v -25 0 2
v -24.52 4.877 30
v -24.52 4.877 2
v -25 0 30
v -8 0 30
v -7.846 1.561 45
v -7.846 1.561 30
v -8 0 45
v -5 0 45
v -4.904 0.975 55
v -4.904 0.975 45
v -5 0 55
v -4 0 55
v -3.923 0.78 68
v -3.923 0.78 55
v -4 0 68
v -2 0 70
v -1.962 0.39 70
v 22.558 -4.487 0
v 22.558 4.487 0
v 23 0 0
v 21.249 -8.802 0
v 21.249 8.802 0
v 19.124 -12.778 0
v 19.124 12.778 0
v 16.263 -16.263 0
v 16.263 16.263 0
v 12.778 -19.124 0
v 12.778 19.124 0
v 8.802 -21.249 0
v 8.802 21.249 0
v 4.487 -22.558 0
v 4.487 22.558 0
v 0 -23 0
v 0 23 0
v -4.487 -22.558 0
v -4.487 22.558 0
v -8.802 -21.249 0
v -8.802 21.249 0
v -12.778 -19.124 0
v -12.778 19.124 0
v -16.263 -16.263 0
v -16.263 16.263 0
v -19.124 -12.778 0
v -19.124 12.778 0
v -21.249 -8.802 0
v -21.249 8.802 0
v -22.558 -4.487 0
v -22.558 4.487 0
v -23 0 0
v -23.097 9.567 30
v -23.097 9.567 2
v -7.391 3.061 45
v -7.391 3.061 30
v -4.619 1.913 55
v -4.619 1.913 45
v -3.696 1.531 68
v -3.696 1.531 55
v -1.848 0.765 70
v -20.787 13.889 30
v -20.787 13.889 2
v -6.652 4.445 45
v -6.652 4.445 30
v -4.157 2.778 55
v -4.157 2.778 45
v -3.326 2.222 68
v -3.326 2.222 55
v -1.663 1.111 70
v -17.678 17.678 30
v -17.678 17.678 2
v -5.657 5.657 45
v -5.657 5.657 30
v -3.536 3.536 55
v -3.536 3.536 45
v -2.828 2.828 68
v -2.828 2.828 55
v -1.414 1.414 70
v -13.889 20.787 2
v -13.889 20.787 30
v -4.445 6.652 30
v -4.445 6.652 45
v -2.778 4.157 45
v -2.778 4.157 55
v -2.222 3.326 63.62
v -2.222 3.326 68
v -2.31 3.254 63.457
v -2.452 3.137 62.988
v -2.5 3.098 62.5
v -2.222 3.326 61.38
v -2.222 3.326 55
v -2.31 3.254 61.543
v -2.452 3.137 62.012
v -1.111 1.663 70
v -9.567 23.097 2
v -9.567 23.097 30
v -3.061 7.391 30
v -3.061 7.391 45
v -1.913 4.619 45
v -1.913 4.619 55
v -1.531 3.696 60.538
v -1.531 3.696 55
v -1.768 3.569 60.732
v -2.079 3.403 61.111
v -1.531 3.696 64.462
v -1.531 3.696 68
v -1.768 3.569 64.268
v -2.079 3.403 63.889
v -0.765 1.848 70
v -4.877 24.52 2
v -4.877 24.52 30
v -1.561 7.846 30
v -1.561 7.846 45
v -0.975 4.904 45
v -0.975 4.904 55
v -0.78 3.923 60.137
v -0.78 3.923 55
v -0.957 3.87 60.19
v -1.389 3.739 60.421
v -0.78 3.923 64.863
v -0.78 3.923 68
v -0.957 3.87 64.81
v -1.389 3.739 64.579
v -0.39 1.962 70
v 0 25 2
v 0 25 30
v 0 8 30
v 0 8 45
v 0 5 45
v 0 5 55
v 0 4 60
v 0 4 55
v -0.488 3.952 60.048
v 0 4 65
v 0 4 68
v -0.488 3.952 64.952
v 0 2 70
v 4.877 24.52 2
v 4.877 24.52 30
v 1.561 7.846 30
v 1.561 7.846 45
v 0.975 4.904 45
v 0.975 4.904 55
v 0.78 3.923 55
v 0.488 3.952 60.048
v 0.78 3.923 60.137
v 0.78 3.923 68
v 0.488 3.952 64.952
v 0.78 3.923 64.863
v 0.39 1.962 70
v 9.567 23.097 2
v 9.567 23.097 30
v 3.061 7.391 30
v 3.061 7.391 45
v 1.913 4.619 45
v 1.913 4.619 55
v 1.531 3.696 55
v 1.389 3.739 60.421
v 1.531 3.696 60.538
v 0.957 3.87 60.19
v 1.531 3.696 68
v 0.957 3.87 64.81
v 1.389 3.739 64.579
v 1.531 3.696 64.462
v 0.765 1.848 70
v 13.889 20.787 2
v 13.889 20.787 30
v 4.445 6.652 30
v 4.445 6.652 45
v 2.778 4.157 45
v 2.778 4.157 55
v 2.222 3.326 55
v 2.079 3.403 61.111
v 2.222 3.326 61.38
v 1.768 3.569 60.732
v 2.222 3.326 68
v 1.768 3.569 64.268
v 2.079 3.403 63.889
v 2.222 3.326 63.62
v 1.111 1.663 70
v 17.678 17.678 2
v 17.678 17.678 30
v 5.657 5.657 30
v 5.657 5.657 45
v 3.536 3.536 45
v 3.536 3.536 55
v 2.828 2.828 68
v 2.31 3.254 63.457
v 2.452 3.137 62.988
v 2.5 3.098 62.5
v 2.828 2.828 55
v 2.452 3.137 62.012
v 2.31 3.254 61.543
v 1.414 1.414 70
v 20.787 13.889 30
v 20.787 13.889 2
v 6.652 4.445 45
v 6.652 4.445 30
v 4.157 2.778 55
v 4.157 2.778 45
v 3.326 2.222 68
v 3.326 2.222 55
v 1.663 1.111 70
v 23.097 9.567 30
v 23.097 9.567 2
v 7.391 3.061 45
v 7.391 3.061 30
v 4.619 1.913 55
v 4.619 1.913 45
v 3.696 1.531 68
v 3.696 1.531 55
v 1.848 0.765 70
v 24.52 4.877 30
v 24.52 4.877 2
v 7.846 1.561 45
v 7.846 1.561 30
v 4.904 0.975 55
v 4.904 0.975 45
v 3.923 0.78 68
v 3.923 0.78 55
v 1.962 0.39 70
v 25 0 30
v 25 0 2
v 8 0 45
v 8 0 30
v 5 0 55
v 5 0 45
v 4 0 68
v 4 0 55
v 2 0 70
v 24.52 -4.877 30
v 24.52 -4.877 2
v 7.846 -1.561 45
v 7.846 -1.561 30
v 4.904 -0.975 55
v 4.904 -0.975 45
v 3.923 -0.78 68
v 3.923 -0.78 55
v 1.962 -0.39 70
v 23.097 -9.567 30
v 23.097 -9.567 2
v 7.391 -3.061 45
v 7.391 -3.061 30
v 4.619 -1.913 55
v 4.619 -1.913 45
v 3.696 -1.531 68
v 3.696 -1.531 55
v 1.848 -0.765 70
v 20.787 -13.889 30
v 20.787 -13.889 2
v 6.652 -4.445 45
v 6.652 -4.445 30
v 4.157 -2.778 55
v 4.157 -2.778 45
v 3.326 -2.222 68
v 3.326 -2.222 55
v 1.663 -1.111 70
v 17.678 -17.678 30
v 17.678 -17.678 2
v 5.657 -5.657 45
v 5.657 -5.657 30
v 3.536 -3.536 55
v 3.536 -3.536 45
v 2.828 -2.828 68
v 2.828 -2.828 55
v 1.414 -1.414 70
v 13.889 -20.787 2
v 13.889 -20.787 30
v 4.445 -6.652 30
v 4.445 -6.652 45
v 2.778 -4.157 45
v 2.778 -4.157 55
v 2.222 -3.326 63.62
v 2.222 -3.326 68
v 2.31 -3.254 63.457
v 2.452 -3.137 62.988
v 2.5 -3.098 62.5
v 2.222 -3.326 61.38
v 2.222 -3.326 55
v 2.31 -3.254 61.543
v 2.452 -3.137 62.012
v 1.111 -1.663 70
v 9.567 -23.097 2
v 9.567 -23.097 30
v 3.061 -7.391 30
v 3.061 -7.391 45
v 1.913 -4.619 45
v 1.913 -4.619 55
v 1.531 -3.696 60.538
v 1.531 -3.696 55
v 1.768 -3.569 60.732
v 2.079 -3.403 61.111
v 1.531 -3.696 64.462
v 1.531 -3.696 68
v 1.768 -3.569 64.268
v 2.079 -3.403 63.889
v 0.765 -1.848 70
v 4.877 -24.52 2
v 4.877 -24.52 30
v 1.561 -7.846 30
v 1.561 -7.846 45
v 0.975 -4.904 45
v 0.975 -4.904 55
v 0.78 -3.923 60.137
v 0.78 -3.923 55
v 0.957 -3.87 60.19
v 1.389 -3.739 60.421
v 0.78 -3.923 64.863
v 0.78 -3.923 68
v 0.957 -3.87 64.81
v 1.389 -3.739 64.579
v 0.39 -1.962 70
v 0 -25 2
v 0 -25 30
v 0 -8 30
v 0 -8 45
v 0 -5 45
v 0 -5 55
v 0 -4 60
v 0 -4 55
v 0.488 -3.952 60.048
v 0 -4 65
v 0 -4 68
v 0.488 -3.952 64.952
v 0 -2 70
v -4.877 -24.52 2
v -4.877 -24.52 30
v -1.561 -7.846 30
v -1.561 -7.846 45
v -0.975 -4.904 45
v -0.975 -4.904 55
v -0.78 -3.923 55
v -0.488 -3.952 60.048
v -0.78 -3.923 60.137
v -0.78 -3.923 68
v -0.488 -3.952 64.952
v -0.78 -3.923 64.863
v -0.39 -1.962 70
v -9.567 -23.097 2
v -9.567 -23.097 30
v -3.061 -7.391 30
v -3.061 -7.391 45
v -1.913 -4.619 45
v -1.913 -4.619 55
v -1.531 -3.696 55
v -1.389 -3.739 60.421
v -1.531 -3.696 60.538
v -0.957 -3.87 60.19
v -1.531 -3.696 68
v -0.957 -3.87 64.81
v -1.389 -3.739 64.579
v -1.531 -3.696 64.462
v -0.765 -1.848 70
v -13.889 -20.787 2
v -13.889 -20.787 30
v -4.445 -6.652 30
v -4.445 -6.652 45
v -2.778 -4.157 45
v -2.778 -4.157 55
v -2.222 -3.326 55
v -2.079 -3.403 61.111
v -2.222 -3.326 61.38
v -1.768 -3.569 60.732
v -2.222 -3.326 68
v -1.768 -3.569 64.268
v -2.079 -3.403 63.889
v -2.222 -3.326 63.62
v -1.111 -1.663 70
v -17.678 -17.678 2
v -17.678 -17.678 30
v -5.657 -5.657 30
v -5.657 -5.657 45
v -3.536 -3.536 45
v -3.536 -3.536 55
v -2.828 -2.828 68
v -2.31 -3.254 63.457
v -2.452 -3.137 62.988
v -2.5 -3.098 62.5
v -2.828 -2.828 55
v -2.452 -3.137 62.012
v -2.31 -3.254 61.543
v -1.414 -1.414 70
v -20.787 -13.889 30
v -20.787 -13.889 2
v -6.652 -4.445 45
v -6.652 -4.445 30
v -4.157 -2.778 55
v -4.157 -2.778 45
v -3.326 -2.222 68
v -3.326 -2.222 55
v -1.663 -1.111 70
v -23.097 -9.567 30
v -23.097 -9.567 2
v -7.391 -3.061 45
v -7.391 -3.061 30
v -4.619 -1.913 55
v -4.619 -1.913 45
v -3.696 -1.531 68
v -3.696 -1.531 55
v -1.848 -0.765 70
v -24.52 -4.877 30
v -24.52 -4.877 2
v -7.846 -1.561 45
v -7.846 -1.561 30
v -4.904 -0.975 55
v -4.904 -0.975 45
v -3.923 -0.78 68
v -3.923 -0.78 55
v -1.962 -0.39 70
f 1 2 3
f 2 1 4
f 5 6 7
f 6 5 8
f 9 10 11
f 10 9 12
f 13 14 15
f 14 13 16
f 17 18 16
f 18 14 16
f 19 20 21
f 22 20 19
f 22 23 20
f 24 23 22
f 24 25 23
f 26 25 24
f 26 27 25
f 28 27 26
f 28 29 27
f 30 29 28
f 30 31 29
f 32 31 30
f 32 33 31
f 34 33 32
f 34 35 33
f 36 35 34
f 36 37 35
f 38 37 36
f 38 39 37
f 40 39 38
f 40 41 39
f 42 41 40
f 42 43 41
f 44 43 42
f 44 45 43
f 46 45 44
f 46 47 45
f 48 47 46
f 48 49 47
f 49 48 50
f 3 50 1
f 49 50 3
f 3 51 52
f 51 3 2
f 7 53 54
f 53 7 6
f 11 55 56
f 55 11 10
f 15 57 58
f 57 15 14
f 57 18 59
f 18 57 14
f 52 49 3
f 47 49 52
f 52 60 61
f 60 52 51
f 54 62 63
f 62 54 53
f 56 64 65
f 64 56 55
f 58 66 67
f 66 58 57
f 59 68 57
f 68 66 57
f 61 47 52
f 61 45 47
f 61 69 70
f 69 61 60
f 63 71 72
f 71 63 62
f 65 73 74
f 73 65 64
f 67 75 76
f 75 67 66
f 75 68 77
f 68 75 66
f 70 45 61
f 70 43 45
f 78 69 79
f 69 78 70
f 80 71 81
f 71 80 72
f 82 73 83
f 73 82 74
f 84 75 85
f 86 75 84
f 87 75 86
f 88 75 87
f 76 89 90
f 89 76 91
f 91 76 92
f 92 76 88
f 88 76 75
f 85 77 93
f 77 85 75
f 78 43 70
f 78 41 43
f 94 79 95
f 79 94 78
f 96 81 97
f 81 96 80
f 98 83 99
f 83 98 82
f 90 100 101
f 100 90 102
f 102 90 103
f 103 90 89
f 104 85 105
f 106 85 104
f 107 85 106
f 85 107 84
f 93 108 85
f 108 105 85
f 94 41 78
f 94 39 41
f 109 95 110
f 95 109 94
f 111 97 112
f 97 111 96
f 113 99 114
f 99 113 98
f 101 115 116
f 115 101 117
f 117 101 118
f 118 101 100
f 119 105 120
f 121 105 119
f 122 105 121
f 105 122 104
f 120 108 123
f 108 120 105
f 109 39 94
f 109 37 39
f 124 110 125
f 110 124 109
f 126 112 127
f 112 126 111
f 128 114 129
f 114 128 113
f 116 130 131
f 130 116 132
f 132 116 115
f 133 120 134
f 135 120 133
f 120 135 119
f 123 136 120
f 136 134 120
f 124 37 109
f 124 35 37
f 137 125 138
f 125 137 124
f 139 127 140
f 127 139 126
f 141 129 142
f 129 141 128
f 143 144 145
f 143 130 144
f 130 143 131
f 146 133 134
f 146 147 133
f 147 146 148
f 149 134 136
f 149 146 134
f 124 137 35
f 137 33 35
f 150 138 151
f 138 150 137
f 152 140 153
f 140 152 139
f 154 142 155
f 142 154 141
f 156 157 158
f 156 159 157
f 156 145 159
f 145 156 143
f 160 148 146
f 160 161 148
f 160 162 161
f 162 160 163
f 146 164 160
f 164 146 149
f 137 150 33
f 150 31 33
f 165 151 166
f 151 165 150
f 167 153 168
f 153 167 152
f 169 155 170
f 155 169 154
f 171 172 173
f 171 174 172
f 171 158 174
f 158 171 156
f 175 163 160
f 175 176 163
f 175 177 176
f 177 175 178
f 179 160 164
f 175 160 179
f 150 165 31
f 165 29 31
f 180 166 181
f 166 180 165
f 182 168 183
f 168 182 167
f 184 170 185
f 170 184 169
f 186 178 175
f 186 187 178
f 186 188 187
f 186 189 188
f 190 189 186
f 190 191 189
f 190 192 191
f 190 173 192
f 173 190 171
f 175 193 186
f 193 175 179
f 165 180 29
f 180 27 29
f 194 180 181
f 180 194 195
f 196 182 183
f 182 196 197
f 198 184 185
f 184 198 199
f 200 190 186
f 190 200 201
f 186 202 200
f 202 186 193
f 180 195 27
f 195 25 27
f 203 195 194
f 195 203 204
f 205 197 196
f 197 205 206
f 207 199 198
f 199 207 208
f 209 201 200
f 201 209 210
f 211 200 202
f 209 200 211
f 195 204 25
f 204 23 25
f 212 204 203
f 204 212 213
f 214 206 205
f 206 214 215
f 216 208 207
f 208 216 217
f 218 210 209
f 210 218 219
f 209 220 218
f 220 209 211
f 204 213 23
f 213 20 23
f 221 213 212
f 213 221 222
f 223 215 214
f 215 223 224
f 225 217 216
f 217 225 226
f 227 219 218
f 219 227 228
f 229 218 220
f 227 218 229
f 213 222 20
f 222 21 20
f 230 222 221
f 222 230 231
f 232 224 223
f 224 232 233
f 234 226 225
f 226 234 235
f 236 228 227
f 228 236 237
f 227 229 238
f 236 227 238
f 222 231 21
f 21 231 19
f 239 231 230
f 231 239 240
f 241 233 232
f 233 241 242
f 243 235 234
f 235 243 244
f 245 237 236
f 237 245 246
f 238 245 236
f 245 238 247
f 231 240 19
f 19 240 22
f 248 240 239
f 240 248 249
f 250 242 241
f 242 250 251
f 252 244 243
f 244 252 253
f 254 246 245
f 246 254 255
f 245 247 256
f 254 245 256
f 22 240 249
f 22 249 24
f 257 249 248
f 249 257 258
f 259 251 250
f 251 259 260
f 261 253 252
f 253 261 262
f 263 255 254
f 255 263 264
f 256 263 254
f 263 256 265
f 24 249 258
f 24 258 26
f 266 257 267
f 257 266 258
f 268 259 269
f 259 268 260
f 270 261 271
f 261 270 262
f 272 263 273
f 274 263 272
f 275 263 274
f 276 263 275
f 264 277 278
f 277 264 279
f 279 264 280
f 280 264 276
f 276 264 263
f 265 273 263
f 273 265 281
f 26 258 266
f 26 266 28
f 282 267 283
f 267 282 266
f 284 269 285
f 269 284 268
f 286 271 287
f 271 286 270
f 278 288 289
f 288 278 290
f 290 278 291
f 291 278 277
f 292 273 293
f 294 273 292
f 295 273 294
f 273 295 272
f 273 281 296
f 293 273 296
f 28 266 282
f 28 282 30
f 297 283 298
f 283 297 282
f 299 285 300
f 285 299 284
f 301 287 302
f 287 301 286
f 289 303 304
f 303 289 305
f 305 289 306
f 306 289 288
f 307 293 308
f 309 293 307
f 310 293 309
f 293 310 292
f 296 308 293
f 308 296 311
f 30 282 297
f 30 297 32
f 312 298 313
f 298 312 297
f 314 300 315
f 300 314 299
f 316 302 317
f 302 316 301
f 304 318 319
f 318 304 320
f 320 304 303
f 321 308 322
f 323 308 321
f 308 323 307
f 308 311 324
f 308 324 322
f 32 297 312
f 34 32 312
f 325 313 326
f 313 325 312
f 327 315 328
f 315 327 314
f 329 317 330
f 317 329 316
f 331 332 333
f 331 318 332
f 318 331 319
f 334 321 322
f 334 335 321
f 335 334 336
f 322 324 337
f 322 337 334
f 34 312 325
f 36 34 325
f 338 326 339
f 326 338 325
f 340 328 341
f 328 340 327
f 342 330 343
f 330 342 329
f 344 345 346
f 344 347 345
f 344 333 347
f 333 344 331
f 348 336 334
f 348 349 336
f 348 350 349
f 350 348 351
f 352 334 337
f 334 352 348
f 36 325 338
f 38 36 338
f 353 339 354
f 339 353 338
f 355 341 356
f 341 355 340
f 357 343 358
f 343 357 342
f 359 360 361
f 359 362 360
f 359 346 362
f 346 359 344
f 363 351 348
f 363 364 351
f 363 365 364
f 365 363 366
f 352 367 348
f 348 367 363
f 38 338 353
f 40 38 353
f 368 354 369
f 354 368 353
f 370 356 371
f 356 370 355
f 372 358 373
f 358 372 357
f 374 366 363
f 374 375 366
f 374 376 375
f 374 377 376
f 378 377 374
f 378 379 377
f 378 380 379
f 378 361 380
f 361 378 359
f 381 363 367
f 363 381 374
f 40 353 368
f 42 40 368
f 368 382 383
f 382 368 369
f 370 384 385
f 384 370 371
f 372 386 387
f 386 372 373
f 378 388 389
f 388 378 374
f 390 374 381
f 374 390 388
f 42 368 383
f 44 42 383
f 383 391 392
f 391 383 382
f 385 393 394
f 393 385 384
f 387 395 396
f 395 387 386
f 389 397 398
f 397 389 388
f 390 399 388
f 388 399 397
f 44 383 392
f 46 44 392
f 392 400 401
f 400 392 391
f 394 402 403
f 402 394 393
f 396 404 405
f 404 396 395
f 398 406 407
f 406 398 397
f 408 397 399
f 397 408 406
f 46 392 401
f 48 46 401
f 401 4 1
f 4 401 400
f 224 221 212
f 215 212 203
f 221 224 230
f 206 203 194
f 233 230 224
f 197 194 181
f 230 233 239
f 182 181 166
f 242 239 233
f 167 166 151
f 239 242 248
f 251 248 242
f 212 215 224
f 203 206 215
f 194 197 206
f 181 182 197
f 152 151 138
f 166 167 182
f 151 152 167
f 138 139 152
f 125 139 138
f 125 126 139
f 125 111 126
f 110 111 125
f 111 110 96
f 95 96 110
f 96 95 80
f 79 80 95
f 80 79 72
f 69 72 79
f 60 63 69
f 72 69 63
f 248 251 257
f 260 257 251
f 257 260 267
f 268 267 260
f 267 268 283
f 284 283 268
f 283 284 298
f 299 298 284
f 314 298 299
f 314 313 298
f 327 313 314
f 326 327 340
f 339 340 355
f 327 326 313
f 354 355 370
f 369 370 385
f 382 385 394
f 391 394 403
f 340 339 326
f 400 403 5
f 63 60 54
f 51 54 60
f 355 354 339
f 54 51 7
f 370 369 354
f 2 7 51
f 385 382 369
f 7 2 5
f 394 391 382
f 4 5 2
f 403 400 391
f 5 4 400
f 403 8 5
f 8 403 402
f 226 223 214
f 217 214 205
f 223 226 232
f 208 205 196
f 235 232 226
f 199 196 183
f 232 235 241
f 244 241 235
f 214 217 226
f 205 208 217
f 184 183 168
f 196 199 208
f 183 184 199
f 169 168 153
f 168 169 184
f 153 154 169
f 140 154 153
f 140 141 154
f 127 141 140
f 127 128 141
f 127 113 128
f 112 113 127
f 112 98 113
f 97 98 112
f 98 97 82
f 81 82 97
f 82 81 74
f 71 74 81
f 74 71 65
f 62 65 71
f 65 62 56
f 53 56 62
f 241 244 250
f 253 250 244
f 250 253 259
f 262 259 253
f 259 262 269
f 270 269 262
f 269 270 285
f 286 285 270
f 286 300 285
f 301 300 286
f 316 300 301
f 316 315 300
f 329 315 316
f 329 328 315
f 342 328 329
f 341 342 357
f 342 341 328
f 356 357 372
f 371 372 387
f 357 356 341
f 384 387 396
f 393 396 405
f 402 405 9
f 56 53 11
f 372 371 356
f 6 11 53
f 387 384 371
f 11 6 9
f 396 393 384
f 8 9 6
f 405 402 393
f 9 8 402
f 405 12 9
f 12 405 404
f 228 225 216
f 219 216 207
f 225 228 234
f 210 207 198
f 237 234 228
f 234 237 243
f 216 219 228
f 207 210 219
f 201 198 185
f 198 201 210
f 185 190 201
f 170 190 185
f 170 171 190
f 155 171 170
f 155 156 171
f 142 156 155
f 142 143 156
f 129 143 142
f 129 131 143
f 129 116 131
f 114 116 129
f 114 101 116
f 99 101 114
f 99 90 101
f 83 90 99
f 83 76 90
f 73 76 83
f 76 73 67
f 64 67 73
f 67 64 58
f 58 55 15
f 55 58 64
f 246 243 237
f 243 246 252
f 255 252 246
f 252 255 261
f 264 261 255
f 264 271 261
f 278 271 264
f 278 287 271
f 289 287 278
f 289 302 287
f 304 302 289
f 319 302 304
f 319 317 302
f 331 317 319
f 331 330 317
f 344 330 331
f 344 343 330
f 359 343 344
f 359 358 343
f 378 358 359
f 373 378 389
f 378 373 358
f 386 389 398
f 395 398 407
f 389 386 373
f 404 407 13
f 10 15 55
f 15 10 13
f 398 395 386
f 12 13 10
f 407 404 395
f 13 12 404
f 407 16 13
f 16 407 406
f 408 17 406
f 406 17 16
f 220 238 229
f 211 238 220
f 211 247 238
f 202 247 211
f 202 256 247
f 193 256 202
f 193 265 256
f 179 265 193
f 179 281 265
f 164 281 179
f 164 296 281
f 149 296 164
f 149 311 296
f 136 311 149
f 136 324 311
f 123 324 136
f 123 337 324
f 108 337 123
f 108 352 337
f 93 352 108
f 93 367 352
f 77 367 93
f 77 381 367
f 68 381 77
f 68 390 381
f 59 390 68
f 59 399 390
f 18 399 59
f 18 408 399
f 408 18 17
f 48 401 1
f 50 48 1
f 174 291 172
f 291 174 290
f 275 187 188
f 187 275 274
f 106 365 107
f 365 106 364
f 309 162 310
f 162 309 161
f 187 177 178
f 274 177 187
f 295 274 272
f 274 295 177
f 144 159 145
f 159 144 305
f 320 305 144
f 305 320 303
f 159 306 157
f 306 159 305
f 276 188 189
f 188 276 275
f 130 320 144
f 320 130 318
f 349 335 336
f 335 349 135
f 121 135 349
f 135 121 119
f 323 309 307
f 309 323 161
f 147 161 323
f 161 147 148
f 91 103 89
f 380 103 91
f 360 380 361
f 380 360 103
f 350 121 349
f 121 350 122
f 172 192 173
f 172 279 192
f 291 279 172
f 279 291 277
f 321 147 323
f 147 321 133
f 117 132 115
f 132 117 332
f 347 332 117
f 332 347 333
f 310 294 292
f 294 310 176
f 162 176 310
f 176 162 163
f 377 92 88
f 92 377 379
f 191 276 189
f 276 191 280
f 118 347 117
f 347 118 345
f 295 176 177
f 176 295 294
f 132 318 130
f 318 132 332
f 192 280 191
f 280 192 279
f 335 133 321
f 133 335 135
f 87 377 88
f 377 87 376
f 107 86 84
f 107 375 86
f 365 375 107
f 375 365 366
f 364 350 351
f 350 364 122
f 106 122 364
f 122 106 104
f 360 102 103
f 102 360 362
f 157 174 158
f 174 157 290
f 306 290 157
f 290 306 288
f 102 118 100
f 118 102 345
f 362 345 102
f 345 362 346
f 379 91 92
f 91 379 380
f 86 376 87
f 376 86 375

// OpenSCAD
$fn = 32;

// ----------------------------------------------------------------------
// Stepped shaft: diameters 50, 16, 10, 8 mm, 70 mm long
// ----------------------------------------------------------------------

// --- parameters (mm) ---
d1 = 50;                  // step 1 diameter
len1 = 30;                // step 1 length
d2 = 16;                  // step 2 diameter
len2 = 15;                // step 2 length
d3 = 10;                  // step 3 diameter
len3 = 10;                // step 3 length
d4 = 8;                   // step 4 diameter
len4 = 15;                // step 4 length
total = 70;               // overall length
chamfer = 2;              // end chamfer
key_w = 5;                // keyway width
key_d = 2.5;              // keyway depth
key_len = 24;             // keyway length
key_z = 43;               // keyway start along the shaft
cross_d = 5;              // cross pin hole
cross_z = 62.5;           // cross hole position

/* closed turning profile: x is the radius, y is the length */
profile = [[0, 0], [25 - chamfer, 0], [25, chamfer], [25, 30], [8, 30], [8, 45], [5, 45], [5, 55], [4, 55], [4, 68], [2, 70], [0, 70]];

difference() {
  rotate_extrude() polygon(profile);
  /* keyway milled into the top of the largest step */
  translate([d1 / 2 - key_d, -key_w / 2, key_z]) cube([key_d + 1, key_w, key_len]);
  /* cross pin hole through the small step */
  translate([0, 0, cross_z]) rotate([90, 0, 0]) cylinder(h = d4 + 4, d = cross_d, center = true);
}
